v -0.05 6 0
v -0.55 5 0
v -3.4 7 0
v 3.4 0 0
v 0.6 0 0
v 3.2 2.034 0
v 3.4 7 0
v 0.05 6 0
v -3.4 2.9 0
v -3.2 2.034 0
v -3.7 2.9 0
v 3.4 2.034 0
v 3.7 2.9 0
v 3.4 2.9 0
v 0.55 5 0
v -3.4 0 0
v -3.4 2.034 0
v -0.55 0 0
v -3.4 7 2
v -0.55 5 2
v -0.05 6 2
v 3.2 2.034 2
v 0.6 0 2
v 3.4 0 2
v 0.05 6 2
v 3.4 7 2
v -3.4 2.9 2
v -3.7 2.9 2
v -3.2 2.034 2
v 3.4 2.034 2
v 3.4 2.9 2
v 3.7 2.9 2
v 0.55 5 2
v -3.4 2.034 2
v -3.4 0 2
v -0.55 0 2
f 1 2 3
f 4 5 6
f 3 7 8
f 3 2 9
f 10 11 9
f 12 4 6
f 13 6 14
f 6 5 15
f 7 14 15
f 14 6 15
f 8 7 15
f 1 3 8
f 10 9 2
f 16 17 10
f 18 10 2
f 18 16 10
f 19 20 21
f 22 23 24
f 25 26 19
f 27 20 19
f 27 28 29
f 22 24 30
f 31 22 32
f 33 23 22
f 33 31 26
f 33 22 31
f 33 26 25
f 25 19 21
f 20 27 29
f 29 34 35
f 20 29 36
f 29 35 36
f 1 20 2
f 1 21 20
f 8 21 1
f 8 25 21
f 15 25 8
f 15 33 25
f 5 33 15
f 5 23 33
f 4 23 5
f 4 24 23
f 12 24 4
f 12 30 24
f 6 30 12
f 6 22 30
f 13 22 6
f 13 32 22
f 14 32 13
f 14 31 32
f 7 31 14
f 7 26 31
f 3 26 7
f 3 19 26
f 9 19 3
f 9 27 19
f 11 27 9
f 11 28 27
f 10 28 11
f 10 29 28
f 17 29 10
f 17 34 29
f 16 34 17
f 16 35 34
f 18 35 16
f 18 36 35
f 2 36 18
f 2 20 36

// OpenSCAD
// file: bezier.scad
/*
bezier curve generator using $fn number of steps between points
v1.0.0
Pavan Dayal

example:
    pts = [
        [0,0],
        [1,0, 0.4,0.2],
        [1,5, 0,0.1, 2,-1],
        [2,7, 0,1],
        [1,9, -0.3,0.2],
        [0,9]
    ];

    translate([0,-12,0]) {
        translate([0,0,0]) polygon(bezier_poly(pts, $fn=12));
        translate([4,0,0]) polygon(bezier_poly(pts, basic=true));
    };

    echo(bezier_poly(pts, $fn=4));

    rotate_extrude($fn=60) polygon(bezier_poly(pts, $fn=12));
*/

function bezier_poly(points, basic=false) = (
    // array of points, each point has 2-6 items
    // which corresponds to 1, 2, or 3 (x,y) pairs
    // with optional points representing 1-2 handle ties in relative coordinates
    // basic=true just makes lines between each point no interpolation
    let (
        interpolate = function (p, q, t)
            let (
                qax = ((len(q) >= 4) ? ((len(q) >= 6) ? q[4] : -q[2]) : 0),
                qay = ((len(q) >= 4) ? ((len(q) >= 6) ? q[5] : -q[3]) : 0)
            ) [
            pow(1-t,3) * p[0]
                + 3 * pow(1-t,2) * t * (p[0] + ((len(p) >= 4) ? p[2] : 0))
                + 3 * (1-t) * pow(t,2) * (q[0] + qax)
                + pow(t,3) * q[0],
            pow(1-t,3) * p[1]
                + 3 * pow(1-t,2) * t * (p[1] + ((len(p) >= 4) ? p[3] : 0))
                + 3 * (1-t) * pow(t,2) * (q[1] + qay)
                +  pow(t,3) * q[1]
        ],

        make_points = function (p, q)
            concat(
                [[p[0],p[1]]],
                [
                    for (i=[1:$fn]) interpolate(p, q, i/($fn+1))
                ]
        )

    ) (basic) ?
        [
            for (p=points)
                [p[0],p[1]]
        ]
    :
        concat(
            [
                for (i=[0:len(points)-2])
                    each make_points(points[i], points[i+1])
            ],
            [[points[len(points)-1][0],points[len(points)-1][1]]]
        )
);
// main file
/*
snap fit joint generator male and female parts
v1.1.0
Pavan Dayal
*/
include<bezier.scad>


#linear_extrude(2)
    snap_male(
        width = 8,
        base_height = 1,
        wall = 0.3,
        guide_width = 1,
        guide_height = 6,
        snap_height = 3,
        snap_top_rounding = 0.2,
        snap_angle = 30,
        snap_width = 0.5,
        snap_dx = 0.2,
        $fn=5
    );

!linear_extrude(2)
    snap_female(
        width = 8,
        base_height = 1,
        slop = 0.1,
        guide_width = 1,
        guide_height = 6,
        snap_height = 3,
        snap_top_rounding = 0.2,
        snap_angle = 30,
        snap_width = 0.5,
        snap_dx = 0.2,
        $fn=5
    );



//notched snap joint made3 to fit a clip
module snap_female(
        width = 6,
        base_height = 1,
        slop = 0.1,
        guide_width = 1,
        guide_height = 6,
        snap_height = 3,
        snap_top_rounding = 0.2,
        snap_angle = 30,
        snap_width = 0.5,
        snap_dx = 0.2,
    ) {
    snap_dy = (snap_dx+snap_width-snap_top_rounding) / tan(snap_angle);
    resolution = $fn;

    contour = let (
            w2 = width / 2,
            bh = base_height,
            sh = snap_height,
            sw = snap_width,
            sddx = snap_top_rounding,
            sdx = snap_dx,
            sdy = snap_dy,
            gw = guide_width,
            gw2 = guide_width / 2,
            gh = guide_height,
            S = slop
        ) bezier_poly([
            [gw2+S,0                     ],
            [w2-sw-S,0                   ],
            [w2-sw-S,sh-sdy-S            ],
            [w2-sw-sdx-S,sh-sdy-S        ],
            [w2-sddx-S,sh-S              ],
            [w2-sw-S,sh-S                ],
            [w2-sw-S,sh+S                ],
            [w2-sw-S,gh+bh               ],
            [-w2+sw+S,gh+bh              ],
            [-w2+sw+S,sh+S               ],
            [-w2+sw+S,sh-S               ],
            [-w2+sddx+S,sh-S             ],
            [-w2+sw+sdx+S,sh-sdy-S       ],
            [-w2+sw+S,sh-sdy-S           ],
            [-w2+sw+S,0                  ],
            [-gw2-S/2,0                  ],
            [-gw2-S/2,gh-bh              ],
            [-S/2,gh                     ],
            [S/2,gh                      ],
            [gw2+S/2,gh-bh               ]
        ], basic=true);

    polygon(points=contour);
}




// trident shaped clip that slides into female snap joint
module snap_male(
        width = 6,
        base_height = 1,
        wall = 0.3,
        guide_width = 1,
        guide_height = 6,
        snap_height = 3,
        snap_top_rounding = 0.2,
        snap_angle = 30,
        snap_width = 0.5,
        snap_dx = 0.2,
    ) {
    snap_dy = (snap_dx+snap_width-snap_top_rounding) / tan(snap_angle);

    resolution = $fn;

    outside = let (
            w2 = width / 2,
            bh = base_height,
            sh = base_height + snap_height,
            sw = snap_width,
            sddx = snap_top_rounding,
            sdx = snap_dx,
            sdy = snap_dy,
            gw = guide_width,
            gw2 = guide_width / 2,
            gh = guide_height
        ) bezier_poly([
            [0,0                         ],
            [w2,0                        ],
            [w2,bh,                      ],
            [w2,sh,                      ],
            [w2-sddx,sh                  ],
            [w2-sw-sdx,sh-sdy            ],
            [w2-sw,sh-sdy                ],
            [w2-sw,bh                    ],
            [gw2, bh                     ],
            [gw2, gh                     ],
            [0, bh+gh                    ],
            [-gw2, gh                    ],
            [-gw2, bh                    ],
            [-w2+sw,bh                   ],
            [-w2+sw,sh-sdy               ],
            [-w2+sw+sdx,sh-sdy           ],
            [-w2+sddx,sh                 ],
            [-w2,sh,                     ],
            [-w2,bh,                     ],
            [-w2,0                       ]
        ], basic=true);
    outside_N = len(outside);

    hole1 = let (
            w2 = width / 2,
            bh = base_height,
            bh2 = base_height / 2,
            W = wall,
            W2 = wall / 2,
            r=bh2-W
        ) bezier_poly([
            [W+W2,bh2,          0,-r  ],
            [W+W2+r,W                 ],
            [w2-W-r,W                 ],
            [w2-W,bh2,          0,r   ],
            [w2-W-r,bh-W              ],
            [W+W2+r,bh-W                ],
            [W+W2,bh2,          0,-r  ]
        ], $fn=resolution);
    hole1_N = len(hole1);

    hole2 = [ for (p=hole1) [-p[0], p[1]] ];
    hole2_N = len(hole2);

    hole3 = let (
            w2 = width / 2,
            bh = base_height,
            gw = guide_width,
            gw2 = guide_width / 2,
            gh = guide_height,
            W = wall,
            W2 = wall / 2,
            r = gw2-W
        ) bezier_poly([
            [0,bh,            r,0   ],
            [gw2-W,bh+r             ],
            [gw2-W,gh-W             ],
            [0,gh-W+r,        -r,0  ],
            [-gw2+W,gh-W            ],
            [-gw2+W,bh+r            ],
            [0,bh,            r,0   ]
        ], $fn=resolution);
    hole3_N = len(hole3);

    translate([0,-base_height,0]) polygon(
        points=concat(
            outside,
            hole1,
            hole2,
            hole3
        )
        , paths=[
            [ for (j=[0:1:outside_N-1]) j ],
            [ for (j=[outside_N:1:outside_N+hole1_N-1]) j ],
            [ for (j=[outside_N+hole1_N:1:outside_N+hole1_N+hole2_N-1]) j ],
            [ for (j=[outside_N+hole1_N+hole2_N:1:outside_N+hole1_N+hole2_N+hole3_N-1]) j ]
        ]);
}
